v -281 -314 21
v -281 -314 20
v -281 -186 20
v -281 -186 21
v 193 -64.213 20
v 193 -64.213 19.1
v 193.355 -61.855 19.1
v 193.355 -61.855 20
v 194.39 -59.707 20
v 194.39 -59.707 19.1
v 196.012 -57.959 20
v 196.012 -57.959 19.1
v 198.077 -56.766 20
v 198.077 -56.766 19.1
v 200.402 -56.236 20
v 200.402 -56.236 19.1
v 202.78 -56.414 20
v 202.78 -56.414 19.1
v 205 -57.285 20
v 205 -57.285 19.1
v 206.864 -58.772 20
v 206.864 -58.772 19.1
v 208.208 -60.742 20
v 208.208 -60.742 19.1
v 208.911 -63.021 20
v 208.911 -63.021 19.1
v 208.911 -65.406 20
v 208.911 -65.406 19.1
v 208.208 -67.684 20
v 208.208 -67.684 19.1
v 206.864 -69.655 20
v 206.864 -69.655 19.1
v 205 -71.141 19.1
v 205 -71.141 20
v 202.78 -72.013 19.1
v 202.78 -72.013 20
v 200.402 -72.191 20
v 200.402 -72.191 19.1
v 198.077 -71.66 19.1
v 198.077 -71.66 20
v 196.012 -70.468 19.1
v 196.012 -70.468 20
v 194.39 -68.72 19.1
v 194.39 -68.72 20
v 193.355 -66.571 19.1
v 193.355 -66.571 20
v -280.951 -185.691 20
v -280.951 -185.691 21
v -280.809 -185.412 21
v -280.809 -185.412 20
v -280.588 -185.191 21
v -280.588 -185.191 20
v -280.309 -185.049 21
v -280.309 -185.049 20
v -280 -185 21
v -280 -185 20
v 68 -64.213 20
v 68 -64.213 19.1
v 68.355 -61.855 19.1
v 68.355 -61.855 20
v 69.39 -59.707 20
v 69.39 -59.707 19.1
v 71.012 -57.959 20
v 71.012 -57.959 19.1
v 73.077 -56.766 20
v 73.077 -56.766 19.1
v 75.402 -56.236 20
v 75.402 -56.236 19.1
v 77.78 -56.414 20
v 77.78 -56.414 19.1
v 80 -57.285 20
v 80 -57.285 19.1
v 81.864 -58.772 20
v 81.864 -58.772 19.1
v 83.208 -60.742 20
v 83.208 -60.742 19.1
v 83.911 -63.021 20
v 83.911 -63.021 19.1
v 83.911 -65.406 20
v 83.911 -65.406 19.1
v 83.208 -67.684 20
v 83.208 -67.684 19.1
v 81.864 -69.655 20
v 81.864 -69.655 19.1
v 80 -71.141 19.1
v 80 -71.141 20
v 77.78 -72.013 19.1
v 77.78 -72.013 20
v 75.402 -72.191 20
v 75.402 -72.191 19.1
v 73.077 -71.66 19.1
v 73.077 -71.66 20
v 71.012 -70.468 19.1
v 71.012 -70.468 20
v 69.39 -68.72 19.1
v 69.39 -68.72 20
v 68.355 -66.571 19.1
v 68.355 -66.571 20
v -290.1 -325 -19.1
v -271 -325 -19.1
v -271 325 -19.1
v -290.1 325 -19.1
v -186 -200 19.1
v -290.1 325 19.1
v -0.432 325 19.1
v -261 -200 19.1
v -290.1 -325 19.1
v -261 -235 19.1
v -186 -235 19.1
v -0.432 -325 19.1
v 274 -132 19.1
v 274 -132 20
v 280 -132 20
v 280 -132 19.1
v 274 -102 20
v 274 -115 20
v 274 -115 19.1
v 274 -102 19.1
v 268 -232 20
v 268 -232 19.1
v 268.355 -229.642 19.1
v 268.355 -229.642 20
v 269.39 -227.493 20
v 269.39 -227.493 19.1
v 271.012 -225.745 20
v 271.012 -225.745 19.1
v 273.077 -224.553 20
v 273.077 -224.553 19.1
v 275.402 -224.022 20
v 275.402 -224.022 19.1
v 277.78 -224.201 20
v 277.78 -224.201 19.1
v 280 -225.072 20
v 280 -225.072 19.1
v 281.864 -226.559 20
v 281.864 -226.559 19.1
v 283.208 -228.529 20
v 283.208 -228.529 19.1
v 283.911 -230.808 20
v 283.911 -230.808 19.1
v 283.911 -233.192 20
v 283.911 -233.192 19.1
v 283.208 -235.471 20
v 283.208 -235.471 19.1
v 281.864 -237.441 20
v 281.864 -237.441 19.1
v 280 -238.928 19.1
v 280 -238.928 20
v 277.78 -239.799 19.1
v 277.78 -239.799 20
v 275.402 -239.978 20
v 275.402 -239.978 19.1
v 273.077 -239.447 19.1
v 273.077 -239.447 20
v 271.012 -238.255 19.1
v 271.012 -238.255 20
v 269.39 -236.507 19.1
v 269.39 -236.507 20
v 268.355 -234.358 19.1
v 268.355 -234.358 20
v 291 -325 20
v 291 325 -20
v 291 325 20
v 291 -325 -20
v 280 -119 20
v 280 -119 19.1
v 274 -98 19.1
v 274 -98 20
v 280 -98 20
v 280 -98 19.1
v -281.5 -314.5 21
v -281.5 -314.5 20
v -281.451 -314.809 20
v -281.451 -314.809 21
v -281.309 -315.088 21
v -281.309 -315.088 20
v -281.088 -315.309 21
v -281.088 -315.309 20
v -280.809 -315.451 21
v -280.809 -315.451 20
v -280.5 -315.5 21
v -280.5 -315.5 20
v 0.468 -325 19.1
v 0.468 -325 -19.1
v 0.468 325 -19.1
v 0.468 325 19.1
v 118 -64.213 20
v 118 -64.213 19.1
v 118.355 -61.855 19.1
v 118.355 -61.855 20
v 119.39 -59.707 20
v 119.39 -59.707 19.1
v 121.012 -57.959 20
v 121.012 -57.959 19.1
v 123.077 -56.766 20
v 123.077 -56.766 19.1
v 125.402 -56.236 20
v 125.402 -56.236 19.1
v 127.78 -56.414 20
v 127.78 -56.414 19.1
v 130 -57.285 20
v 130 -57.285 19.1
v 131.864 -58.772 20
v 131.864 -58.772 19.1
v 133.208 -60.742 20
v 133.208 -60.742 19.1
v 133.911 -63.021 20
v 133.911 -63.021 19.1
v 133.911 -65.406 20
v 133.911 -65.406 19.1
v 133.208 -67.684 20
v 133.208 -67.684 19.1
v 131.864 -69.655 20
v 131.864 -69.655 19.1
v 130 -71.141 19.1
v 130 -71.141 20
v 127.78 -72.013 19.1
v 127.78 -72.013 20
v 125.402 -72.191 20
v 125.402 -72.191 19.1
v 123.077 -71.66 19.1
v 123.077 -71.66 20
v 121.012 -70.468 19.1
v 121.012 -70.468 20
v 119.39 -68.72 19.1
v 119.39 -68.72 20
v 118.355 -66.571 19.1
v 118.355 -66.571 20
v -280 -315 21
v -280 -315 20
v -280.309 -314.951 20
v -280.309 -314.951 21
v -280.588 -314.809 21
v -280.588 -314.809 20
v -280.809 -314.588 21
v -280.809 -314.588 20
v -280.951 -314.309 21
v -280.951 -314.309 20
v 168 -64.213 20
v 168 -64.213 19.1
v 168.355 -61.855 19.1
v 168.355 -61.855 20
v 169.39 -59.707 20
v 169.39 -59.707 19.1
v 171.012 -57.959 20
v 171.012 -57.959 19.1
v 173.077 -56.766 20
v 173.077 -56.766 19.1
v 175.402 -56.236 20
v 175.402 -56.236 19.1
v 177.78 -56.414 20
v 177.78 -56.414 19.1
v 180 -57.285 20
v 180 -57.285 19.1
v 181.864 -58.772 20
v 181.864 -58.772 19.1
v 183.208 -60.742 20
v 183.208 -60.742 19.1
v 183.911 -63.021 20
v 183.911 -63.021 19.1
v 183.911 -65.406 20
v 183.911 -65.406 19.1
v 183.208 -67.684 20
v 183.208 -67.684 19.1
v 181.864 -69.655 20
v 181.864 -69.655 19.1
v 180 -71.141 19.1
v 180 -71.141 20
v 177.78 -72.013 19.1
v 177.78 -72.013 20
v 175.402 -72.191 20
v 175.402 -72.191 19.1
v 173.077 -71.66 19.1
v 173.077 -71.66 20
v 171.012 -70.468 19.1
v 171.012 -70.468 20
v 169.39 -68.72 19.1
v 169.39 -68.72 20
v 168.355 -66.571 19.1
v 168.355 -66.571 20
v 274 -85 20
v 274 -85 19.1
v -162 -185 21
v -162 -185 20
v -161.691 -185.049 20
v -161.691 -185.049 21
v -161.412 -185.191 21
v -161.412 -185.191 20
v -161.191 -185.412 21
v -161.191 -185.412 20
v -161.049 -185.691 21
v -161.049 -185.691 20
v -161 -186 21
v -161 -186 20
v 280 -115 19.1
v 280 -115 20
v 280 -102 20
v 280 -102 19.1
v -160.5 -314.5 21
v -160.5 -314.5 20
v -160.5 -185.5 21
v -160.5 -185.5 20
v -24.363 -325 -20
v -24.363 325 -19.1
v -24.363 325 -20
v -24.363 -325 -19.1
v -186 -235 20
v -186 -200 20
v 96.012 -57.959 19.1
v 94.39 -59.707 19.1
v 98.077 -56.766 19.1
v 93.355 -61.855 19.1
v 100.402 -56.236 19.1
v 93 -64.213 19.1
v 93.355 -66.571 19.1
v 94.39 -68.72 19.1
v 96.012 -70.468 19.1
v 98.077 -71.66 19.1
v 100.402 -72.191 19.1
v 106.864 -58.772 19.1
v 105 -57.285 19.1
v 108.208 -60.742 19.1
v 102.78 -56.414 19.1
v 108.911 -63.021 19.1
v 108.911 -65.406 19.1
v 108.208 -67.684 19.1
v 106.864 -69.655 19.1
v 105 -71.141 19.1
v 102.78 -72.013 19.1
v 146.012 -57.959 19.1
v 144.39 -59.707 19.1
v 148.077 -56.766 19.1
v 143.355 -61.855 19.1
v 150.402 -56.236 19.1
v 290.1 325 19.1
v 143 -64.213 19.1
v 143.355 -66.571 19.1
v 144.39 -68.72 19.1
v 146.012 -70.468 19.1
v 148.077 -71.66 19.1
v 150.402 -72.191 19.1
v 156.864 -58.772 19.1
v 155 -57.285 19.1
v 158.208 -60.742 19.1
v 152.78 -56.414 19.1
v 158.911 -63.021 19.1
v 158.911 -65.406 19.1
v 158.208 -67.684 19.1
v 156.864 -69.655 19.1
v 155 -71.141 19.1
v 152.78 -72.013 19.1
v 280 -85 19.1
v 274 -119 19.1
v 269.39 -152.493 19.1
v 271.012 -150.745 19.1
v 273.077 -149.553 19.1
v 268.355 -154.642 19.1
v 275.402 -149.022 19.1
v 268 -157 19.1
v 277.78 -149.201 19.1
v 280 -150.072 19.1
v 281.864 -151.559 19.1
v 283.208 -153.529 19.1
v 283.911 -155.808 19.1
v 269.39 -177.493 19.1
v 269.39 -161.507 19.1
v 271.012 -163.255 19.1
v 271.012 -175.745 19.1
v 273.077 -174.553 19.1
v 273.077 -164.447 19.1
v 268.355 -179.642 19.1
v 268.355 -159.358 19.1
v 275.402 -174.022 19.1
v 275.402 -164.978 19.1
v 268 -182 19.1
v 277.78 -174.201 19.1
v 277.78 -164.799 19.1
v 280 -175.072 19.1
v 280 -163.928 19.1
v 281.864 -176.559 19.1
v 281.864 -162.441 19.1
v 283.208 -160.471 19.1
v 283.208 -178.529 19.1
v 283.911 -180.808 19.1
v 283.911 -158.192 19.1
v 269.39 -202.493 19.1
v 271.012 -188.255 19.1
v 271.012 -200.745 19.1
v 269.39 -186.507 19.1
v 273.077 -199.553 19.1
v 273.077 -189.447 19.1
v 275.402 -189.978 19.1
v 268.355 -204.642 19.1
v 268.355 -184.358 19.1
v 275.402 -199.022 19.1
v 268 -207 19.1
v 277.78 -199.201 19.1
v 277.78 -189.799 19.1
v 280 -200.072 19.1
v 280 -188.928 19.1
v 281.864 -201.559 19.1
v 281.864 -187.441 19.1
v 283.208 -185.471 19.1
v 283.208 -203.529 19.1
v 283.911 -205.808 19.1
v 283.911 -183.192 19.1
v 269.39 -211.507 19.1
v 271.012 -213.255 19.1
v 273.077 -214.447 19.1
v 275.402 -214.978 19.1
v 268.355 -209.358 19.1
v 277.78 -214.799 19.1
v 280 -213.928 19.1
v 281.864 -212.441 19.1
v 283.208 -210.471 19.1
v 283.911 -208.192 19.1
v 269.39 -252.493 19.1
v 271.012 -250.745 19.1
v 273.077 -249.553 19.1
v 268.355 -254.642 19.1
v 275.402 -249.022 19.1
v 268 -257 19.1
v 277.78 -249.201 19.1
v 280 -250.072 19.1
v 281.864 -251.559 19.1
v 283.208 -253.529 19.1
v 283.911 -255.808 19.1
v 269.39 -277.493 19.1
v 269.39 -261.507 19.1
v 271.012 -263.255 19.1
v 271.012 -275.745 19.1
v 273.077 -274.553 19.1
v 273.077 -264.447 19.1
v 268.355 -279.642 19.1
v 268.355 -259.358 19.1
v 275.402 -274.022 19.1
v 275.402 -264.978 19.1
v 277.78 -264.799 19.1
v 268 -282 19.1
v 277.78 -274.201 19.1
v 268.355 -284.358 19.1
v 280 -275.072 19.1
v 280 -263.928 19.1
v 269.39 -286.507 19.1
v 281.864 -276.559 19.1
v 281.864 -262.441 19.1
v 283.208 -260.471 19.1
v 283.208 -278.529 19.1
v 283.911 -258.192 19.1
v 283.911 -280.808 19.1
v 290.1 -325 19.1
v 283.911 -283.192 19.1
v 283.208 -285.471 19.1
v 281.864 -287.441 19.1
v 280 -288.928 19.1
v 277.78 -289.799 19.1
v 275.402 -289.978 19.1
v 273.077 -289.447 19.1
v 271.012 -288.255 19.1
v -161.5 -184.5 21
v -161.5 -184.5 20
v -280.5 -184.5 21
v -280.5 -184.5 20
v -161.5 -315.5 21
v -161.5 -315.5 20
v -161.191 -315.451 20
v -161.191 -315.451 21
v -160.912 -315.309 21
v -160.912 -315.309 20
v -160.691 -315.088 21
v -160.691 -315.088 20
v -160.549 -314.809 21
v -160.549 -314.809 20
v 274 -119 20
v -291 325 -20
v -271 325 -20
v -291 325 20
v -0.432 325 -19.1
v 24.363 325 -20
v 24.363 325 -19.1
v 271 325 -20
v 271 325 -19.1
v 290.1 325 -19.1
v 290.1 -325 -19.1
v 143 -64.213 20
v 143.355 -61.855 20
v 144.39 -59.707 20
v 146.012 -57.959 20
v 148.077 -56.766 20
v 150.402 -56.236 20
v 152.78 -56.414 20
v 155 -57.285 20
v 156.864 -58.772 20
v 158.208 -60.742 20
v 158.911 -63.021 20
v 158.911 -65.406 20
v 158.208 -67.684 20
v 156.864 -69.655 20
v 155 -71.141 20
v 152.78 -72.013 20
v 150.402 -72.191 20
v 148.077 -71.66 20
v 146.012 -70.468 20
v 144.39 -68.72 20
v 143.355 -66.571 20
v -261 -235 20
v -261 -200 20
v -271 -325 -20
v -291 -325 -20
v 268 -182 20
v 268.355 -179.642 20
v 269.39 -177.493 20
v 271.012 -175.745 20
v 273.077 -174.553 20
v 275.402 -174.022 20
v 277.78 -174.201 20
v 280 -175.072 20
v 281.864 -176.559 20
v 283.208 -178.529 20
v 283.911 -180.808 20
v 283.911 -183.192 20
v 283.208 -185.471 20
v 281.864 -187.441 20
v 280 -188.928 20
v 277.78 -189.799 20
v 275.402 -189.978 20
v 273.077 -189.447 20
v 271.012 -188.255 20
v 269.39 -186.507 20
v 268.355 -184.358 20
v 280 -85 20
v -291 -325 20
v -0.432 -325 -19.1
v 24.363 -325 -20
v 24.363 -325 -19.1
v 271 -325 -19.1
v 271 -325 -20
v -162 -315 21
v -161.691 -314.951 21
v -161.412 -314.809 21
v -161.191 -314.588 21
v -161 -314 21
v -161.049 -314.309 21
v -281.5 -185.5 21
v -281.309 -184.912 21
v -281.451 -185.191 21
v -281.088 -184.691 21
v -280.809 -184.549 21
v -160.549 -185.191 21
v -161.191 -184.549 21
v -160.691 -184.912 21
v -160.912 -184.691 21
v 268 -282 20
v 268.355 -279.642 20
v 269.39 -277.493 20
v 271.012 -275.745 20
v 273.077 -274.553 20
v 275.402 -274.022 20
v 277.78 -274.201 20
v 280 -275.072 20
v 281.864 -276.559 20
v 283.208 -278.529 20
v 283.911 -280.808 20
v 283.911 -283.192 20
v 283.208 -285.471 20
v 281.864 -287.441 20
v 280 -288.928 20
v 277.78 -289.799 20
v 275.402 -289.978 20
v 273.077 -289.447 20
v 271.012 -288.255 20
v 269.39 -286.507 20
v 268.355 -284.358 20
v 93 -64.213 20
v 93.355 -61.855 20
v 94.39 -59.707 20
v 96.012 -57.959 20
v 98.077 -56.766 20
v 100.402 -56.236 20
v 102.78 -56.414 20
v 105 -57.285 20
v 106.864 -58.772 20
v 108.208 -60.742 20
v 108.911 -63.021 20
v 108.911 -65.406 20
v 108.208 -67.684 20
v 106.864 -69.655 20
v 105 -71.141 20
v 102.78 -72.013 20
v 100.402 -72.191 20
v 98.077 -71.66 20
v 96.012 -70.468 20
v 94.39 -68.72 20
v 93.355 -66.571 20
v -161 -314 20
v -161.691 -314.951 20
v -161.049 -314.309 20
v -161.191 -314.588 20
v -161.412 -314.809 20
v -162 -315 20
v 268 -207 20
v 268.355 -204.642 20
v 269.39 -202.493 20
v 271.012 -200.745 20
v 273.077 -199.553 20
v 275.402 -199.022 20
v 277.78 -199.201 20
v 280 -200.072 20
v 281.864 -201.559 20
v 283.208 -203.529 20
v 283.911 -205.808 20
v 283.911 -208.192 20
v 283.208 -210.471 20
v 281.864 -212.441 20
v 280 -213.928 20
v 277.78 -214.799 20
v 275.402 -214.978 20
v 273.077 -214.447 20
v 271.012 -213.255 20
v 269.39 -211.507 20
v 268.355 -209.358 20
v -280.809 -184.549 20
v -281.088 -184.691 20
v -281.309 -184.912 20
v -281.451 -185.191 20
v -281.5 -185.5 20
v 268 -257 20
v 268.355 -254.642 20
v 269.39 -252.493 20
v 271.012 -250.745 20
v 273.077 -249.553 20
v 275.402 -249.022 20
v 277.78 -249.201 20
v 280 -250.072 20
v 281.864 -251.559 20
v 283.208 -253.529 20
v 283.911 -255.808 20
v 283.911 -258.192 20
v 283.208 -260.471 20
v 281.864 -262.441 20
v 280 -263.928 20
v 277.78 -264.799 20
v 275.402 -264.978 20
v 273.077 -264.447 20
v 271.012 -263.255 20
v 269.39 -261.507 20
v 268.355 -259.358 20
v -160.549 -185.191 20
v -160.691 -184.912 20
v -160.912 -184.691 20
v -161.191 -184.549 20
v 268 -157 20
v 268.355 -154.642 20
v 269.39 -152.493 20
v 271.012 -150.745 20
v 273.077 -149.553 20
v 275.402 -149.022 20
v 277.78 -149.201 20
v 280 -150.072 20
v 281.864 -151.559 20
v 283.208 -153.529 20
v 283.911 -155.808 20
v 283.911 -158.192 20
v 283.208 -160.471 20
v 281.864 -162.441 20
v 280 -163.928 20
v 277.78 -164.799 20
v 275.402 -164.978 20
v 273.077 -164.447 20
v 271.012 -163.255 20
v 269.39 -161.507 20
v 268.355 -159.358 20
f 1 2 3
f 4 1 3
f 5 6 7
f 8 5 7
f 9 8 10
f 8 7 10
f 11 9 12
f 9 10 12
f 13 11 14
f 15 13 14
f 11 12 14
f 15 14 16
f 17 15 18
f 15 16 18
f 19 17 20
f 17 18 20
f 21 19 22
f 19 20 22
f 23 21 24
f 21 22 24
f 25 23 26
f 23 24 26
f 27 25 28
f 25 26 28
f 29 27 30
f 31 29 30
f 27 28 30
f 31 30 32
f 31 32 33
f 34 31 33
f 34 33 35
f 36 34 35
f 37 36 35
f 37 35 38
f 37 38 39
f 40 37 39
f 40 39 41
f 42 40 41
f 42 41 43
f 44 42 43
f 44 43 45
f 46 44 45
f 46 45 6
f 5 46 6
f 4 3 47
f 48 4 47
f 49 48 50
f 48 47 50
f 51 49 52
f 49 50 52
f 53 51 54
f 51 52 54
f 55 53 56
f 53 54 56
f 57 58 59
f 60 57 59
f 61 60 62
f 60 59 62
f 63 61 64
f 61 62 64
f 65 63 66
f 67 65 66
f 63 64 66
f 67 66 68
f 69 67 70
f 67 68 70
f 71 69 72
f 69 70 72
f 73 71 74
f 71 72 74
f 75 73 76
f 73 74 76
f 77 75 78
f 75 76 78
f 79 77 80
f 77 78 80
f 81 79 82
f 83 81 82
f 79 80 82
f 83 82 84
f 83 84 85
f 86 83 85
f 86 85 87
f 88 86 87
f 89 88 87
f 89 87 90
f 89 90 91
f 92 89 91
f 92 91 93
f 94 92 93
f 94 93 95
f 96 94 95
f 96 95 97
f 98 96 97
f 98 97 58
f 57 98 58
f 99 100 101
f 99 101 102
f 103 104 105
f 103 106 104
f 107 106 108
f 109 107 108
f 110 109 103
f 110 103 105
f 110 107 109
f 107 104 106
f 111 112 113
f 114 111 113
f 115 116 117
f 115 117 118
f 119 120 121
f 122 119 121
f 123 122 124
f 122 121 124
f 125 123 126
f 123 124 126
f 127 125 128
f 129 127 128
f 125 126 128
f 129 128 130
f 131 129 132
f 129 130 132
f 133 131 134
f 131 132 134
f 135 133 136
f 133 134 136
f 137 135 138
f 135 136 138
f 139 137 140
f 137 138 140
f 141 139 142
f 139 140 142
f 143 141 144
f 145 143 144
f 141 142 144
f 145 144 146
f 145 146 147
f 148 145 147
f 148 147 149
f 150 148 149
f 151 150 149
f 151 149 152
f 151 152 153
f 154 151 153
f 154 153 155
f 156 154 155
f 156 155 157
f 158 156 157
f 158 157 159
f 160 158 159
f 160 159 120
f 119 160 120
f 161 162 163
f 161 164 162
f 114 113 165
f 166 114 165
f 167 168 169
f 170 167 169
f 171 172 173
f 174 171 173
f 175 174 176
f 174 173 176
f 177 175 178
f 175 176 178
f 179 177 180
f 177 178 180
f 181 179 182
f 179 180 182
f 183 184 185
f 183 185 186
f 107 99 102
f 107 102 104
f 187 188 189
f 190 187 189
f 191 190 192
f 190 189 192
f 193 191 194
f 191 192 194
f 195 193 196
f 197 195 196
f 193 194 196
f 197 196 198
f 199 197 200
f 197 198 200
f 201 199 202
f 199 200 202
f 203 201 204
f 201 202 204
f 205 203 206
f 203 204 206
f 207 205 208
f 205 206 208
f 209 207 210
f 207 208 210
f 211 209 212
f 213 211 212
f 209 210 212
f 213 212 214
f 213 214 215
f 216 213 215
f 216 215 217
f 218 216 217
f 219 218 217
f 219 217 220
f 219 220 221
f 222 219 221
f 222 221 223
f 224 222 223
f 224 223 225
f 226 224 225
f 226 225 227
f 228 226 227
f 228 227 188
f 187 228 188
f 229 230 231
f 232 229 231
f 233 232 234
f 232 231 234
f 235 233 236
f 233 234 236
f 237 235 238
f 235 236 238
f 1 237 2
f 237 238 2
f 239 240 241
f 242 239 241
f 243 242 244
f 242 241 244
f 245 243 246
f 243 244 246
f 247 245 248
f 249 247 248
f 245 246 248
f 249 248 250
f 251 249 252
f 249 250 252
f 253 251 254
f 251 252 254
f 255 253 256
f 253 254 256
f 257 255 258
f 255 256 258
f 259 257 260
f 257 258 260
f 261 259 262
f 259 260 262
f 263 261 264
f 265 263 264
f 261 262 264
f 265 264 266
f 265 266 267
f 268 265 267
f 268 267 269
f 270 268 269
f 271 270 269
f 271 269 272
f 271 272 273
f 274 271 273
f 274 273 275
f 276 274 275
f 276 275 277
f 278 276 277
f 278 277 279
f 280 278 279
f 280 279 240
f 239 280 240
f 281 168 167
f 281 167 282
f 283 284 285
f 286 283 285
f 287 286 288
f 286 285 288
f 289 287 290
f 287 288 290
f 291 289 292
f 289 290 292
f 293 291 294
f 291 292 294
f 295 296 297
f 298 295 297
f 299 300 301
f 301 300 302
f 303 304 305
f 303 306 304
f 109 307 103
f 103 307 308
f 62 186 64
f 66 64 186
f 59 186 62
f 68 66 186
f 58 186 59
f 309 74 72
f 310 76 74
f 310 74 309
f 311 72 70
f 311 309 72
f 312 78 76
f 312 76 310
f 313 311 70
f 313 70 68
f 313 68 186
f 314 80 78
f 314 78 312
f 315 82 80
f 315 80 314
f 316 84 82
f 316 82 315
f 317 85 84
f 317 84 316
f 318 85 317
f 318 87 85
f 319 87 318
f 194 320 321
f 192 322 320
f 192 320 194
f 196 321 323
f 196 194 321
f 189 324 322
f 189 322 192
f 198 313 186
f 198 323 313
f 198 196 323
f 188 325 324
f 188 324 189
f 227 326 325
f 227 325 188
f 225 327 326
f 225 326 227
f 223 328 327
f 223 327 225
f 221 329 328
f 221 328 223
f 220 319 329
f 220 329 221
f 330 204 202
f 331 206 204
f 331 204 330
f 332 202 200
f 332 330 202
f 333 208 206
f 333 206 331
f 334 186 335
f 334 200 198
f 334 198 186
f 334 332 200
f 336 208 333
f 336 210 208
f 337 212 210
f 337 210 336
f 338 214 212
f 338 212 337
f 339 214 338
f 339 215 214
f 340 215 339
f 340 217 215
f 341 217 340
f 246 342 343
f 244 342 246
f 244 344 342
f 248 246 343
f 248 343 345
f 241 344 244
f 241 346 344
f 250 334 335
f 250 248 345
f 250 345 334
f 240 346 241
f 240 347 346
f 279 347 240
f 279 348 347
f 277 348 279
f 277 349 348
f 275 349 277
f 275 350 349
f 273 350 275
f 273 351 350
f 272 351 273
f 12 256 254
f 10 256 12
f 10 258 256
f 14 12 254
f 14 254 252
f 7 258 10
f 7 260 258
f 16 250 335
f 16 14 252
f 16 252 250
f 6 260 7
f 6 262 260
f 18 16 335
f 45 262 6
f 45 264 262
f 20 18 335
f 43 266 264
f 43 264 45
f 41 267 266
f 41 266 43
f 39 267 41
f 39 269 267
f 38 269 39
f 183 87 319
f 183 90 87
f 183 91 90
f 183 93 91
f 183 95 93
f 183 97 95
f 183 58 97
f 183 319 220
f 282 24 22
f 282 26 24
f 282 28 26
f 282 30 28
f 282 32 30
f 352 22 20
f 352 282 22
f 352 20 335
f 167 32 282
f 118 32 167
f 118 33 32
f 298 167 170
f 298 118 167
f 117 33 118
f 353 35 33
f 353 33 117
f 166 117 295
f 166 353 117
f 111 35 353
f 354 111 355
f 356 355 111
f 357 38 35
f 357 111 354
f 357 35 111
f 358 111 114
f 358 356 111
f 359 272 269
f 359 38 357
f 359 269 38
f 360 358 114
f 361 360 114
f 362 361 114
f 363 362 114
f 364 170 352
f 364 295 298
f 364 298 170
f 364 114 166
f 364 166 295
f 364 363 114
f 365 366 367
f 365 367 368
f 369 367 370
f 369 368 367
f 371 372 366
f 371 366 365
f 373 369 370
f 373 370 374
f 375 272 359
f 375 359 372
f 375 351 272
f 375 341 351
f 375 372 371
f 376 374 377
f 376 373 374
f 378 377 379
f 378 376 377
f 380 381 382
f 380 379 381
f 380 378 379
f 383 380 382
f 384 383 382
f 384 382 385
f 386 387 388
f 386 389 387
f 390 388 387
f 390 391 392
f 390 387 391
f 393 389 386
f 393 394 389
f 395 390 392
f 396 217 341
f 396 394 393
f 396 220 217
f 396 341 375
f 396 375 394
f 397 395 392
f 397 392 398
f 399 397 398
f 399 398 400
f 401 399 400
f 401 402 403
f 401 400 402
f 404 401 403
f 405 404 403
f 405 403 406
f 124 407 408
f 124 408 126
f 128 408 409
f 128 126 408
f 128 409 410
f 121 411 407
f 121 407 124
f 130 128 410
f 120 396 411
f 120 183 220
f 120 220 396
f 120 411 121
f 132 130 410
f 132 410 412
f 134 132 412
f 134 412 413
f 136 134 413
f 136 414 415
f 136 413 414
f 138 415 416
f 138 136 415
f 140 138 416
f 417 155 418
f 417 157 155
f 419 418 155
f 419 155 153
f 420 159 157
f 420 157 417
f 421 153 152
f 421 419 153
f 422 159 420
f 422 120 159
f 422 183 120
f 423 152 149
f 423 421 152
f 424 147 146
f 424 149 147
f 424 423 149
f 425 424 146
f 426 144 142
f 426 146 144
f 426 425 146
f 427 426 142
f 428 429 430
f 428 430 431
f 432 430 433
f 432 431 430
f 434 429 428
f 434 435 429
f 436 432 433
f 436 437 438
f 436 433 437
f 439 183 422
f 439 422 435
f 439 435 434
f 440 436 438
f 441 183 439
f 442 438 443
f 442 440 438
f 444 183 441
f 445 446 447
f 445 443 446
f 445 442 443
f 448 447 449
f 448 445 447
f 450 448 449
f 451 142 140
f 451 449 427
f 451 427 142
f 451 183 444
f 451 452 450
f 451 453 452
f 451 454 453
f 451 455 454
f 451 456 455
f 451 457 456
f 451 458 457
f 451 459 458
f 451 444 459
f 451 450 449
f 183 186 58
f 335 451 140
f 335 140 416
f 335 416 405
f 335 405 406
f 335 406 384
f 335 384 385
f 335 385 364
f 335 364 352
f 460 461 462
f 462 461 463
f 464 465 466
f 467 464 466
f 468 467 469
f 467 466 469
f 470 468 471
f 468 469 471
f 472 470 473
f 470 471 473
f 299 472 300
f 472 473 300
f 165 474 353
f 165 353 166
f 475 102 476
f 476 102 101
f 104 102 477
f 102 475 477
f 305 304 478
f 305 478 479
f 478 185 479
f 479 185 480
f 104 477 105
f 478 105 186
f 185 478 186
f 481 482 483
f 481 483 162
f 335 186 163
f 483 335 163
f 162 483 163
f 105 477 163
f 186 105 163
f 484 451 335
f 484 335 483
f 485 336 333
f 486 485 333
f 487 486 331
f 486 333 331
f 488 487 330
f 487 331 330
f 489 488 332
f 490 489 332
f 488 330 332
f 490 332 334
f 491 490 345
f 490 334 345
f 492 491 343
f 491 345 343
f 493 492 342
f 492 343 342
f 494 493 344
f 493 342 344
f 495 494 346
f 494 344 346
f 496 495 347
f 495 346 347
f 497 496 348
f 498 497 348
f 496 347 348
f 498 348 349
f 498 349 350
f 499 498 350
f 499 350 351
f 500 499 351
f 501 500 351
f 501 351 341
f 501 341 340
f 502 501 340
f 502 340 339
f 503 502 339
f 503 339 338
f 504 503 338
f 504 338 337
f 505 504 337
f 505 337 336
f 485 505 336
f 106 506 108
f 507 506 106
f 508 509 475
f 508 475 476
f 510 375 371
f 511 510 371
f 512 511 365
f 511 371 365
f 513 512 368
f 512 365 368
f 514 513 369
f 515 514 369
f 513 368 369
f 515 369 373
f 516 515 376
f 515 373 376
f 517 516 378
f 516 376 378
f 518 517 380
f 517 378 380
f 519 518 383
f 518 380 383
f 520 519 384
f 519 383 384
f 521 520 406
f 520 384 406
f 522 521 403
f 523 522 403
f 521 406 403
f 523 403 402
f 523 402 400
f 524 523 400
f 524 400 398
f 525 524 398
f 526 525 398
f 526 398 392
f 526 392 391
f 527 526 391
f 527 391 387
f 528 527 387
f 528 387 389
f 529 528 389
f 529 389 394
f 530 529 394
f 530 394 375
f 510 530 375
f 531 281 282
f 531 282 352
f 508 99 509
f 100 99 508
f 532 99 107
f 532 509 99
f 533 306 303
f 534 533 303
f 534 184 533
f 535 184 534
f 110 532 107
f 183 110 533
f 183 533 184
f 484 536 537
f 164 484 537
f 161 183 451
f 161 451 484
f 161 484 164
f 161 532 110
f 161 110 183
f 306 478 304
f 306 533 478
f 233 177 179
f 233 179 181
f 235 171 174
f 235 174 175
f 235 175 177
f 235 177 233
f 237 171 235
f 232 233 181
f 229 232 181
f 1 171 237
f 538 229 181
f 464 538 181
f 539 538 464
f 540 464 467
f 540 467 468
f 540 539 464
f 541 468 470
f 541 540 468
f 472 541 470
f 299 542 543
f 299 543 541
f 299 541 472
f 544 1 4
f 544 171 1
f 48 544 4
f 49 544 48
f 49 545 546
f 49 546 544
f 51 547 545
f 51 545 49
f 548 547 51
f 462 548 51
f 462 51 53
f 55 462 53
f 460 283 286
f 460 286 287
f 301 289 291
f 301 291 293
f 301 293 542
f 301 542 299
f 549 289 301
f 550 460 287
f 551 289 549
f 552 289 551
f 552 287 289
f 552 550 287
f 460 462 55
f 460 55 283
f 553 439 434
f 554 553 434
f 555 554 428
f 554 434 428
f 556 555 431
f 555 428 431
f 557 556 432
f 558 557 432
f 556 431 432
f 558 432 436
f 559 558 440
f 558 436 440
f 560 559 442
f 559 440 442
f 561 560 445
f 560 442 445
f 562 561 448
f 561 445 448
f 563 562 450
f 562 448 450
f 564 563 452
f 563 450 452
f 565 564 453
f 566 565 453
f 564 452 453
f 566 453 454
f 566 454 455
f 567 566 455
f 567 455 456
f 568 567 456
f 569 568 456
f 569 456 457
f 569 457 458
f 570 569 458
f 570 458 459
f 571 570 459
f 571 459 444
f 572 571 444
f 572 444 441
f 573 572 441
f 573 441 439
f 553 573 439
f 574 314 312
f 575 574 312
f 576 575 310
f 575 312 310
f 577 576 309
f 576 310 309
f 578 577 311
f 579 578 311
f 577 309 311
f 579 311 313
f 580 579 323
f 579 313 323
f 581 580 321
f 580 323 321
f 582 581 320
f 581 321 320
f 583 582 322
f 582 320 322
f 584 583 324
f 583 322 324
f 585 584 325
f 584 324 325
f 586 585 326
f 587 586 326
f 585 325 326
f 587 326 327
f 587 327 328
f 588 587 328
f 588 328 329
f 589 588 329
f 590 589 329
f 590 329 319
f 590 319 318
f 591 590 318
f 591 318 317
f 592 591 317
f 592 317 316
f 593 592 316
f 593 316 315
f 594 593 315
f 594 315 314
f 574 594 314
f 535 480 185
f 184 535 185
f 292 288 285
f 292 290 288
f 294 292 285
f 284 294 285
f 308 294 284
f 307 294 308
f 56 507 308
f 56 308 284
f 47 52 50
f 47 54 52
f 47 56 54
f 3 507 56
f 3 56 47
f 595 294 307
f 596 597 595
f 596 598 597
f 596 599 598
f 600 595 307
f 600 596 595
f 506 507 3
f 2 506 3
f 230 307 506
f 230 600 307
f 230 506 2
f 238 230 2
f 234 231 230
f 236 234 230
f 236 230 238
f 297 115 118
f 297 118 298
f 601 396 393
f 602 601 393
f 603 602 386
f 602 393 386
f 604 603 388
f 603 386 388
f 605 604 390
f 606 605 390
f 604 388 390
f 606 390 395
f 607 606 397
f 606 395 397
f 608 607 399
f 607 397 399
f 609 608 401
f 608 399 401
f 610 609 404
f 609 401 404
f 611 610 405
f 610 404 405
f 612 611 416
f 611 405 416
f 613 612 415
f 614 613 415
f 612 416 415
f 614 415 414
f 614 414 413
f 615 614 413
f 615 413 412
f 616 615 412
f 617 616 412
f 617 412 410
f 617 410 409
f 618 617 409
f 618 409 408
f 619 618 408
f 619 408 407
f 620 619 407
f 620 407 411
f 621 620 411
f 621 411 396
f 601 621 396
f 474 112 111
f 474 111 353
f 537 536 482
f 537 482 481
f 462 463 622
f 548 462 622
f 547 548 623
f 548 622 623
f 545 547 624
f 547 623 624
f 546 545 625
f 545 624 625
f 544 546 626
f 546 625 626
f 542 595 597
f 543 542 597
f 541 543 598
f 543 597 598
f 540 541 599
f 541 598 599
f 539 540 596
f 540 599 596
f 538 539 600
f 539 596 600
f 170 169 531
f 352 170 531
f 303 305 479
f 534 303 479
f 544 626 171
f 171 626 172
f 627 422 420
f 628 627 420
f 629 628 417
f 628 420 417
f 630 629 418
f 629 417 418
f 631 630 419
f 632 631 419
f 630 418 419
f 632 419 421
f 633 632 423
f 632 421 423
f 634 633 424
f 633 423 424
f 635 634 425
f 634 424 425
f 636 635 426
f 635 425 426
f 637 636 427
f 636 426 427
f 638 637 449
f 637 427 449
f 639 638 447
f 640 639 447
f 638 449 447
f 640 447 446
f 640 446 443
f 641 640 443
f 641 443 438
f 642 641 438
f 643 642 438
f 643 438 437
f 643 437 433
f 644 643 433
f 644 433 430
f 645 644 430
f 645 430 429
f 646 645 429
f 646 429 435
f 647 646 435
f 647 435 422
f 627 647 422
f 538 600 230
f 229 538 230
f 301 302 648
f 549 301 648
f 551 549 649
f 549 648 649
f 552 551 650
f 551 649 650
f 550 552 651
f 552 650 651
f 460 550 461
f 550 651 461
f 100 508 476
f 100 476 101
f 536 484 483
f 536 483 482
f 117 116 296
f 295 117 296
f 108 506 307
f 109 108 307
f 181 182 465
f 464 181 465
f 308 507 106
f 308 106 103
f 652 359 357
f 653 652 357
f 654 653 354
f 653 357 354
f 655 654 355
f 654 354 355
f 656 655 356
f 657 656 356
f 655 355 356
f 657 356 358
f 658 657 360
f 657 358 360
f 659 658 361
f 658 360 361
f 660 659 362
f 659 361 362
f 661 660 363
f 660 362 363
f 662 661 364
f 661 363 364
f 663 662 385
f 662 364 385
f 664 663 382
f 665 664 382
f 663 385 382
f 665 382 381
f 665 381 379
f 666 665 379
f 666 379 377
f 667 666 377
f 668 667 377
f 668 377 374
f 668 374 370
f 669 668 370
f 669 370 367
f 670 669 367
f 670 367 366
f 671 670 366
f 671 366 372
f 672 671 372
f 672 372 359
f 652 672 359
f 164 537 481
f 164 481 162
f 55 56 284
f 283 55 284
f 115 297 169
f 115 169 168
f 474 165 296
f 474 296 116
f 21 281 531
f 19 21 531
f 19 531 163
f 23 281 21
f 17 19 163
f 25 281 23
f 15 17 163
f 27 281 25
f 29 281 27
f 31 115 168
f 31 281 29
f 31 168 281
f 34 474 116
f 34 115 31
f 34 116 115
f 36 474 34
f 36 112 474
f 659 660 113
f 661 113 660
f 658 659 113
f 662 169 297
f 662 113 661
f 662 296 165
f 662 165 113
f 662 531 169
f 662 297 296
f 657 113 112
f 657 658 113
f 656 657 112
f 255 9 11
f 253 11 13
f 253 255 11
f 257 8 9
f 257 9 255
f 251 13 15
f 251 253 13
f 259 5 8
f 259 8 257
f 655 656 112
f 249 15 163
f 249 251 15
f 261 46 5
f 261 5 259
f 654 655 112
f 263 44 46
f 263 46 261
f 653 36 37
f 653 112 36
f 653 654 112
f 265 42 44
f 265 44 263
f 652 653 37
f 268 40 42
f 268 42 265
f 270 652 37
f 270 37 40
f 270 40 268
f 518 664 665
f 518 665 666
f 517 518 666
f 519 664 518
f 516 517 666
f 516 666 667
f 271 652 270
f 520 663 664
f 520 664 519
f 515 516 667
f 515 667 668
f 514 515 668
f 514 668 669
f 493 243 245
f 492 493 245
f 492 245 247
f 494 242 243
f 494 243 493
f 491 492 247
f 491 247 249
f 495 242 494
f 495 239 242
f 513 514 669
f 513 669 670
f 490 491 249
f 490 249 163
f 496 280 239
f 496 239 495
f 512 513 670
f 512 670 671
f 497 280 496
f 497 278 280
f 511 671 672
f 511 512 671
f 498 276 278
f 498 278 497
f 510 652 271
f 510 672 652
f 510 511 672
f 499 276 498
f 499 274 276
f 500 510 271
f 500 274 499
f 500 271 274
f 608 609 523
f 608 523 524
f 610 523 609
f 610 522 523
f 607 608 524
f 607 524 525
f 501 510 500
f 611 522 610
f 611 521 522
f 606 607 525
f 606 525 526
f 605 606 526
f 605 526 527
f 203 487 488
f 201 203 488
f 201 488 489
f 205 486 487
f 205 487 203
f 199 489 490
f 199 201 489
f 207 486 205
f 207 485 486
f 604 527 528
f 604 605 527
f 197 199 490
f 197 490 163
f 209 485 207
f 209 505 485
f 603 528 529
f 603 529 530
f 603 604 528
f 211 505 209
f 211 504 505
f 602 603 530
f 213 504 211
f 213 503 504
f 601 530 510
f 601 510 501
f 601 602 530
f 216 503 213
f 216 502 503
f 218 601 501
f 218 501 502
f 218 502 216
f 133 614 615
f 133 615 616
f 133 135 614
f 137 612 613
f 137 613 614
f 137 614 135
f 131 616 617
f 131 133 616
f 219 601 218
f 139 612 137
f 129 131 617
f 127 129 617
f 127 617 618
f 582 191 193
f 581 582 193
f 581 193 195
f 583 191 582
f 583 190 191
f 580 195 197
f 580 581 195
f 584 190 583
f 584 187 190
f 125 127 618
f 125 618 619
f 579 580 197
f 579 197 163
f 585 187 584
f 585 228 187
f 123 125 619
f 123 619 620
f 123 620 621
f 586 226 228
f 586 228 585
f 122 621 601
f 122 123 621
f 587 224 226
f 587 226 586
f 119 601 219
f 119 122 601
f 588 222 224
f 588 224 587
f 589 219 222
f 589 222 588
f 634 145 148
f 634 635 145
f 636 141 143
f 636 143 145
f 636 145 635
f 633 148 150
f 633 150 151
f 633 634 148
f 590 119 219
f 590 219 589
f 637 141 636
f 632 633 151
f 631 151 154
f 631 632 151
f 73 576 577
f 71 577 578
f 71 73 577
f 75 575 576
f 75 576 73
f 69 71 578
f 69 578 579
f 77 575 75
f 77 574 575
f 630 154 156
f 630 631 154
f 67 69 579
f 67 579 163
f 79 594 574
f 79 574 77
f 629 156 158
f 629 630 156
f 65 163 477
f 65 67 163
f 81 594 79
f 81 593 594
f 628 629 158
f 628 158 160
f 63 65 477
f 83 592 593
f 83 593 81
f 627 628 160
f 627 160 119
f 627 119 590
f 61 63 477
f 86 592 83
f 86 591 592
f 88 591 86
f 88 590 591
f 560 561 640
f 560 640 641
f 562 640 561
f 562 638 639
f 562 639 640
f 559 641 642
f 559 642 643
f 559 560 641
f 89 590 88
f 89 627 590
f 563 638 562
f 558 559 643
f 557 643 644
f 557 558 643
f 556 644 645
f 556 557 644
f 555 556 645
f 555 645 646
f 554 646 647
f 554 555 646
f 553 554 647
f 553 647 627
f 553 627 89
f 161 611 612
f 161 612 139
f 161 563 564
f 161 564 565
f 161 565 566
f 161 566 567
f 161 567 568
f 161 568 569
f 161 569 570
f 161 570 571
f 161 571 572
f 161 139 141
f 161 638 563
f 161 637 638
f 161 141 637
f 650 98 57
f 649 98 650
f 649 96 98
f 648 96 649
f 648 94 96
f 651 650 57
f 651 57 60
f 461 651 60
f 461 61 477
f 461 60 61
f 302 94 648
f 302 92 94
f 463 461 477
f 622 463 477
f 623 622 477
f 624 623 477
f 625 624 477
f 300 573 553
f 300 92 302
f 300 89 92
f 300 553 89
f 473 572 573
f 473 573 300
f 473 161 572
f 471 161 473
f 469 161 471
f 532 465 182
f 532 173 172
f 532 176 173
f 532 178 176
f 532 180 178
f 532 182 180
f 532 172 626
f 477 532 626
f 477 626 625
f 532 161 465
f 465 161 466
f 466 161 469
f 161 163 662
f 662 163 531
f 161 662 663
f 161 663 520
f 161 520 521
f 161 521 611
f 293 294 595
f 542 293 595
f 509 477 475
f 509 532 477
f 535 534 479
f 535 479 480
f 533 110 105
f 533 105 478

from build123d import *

# Parameters (mm, degrees)
F1_DEPTH = 325
F3_D     = 16
F3_DEPTH = 5
F3_TIP   = 4.8068849522
F2_W     = 6
F2_H     = 13
F2_W_2   = 75
F2_H_2   = 35
F4_DEPTH = 25
F6_DEPTH = 1
F8_DEPTH = 325


# Not quite as in the source:
# - a feature names something its author has since deleted; it is built from what else it names


with BuildPart() as f1:
    # F0 (on Front) → F1 (new body, symmetric)
    with BuildSketch(Plane.XZ):
        Polygon((-291, 20), (-291, -20), (-271, -20), (-271, -19.1), (-290.1, -19.1), (-290.1, 19.1), (290.1, 19.1), (290.1, -19.1), (271, -19.1), (271, -20), (291, -20), (291, 20), align=None)
    extrude(amount=F1_DEPTH, both=True)

    # F3
    with Locations(Plane.XY.offset(20)):
        with Locations((276, -282), (276, -257), (276, -232), (276, -207), (276, -182), (201, -64.213295877), (176, -64.213295877), (151, -64.213295877), (126, -64.213295877), (101, -64.213295877), (76, -64.213295877), (276, -157)):
            Hole(F3_D / 2, depth=F3_DEPTH)
            with Locations((0, 0, -(F3_DEPTH + F3_TIP / 2))):  # 118° drill point
                Cone(0, F3_D / 2, F3_TIP, mode=Mode.SUBTRACT)

    # F2 (on face) → F4 (cut)
    with BuildSketch(Plane.XY.offset(20)):
        with Locations((277, -125.5)):
            Rectangle(F2_W, F2_H)
        with Locations((-223.5, -217.5)):
            Rectangle(F2_W_2, F2_H_2)
        with Locations((277, -108.5)):
            Rectangle(F2_W, F2_H)
        with Locations((277, -91.5)):
            Rectangle(F2_W, F2_H)
    extrude(amount=-F4_DEPTH, mode=Mode.SUBTRACT)

    # F5 (on face) → F6 (join)
    with BuildSketch(Plane.XY.offset(20)):
        with BuildLine():
            Line((-161.5, -184.5), (-280.5, -184.5))
            ThreePointArc((-280.5, -184.5), (-281.2071067812, -184.7928932188), (-281.5, -185.5))
            Line((-281.5, -185.5), (-281.5, -314.5))
            ThreePointArc((-281.5, -314.5), (-281.2071067812, -315.2071067812), (-280.5, -315.5))
            Line((-280.5, -315.5), (-161.5, -315.5))
            ThreePointArc((-161.5, -315.5), (-160.7928932188, -315.2071067812), (-160.5, -314.5))
            Line((-160.5, -314.5), (-160.5, -185.5))
            ThreePointArc((-160.5, -185.5), (-160.7928932188, -184.7928932188), (-161.5, -184.5))
        make_face()
        with BuildLine():
            ThreePointArc((-281, -186), (-280.7071067812, -185.2928932188), (-280, -185))
            Line((-280, -185), (-162, -185))
            ThreePointArc((-162, -185), (-161.2928932188, -185.2928932188), (-161, -186))
            Line((-161, -186), (-161, -314))
            ThreePointArc((-161, -314), (-161.2928932188, -314.7071067812), (-162, -315))
            Line((-162, -315), (-280, -315))
            ThreePointArc((-280, -315), (-280.7071067812, -314.7071067812), (-281, -314))
            Line((-281, -314), (-281, -186))
        make_face(mode=Mode.SUBTRACT)
    extrude(amount=F6_DEPTH)

    # F7 (on Front) → F8 (join, symmetric)
    with BuildSketch(Plane.XZ):
        Polygon((-24.3627466261, -20), (24.3627466261, -20), (24.3627466261, -19.1), (0.4681956061, -19.1), (0.4681956061, 20), (-0.4318043939, 20), (-0.4318043939, -19.1), (-24.3627466261, -19.1), align=None)
    extrude(amount=F8_DEPTH, both=True)


solid = f1.part
